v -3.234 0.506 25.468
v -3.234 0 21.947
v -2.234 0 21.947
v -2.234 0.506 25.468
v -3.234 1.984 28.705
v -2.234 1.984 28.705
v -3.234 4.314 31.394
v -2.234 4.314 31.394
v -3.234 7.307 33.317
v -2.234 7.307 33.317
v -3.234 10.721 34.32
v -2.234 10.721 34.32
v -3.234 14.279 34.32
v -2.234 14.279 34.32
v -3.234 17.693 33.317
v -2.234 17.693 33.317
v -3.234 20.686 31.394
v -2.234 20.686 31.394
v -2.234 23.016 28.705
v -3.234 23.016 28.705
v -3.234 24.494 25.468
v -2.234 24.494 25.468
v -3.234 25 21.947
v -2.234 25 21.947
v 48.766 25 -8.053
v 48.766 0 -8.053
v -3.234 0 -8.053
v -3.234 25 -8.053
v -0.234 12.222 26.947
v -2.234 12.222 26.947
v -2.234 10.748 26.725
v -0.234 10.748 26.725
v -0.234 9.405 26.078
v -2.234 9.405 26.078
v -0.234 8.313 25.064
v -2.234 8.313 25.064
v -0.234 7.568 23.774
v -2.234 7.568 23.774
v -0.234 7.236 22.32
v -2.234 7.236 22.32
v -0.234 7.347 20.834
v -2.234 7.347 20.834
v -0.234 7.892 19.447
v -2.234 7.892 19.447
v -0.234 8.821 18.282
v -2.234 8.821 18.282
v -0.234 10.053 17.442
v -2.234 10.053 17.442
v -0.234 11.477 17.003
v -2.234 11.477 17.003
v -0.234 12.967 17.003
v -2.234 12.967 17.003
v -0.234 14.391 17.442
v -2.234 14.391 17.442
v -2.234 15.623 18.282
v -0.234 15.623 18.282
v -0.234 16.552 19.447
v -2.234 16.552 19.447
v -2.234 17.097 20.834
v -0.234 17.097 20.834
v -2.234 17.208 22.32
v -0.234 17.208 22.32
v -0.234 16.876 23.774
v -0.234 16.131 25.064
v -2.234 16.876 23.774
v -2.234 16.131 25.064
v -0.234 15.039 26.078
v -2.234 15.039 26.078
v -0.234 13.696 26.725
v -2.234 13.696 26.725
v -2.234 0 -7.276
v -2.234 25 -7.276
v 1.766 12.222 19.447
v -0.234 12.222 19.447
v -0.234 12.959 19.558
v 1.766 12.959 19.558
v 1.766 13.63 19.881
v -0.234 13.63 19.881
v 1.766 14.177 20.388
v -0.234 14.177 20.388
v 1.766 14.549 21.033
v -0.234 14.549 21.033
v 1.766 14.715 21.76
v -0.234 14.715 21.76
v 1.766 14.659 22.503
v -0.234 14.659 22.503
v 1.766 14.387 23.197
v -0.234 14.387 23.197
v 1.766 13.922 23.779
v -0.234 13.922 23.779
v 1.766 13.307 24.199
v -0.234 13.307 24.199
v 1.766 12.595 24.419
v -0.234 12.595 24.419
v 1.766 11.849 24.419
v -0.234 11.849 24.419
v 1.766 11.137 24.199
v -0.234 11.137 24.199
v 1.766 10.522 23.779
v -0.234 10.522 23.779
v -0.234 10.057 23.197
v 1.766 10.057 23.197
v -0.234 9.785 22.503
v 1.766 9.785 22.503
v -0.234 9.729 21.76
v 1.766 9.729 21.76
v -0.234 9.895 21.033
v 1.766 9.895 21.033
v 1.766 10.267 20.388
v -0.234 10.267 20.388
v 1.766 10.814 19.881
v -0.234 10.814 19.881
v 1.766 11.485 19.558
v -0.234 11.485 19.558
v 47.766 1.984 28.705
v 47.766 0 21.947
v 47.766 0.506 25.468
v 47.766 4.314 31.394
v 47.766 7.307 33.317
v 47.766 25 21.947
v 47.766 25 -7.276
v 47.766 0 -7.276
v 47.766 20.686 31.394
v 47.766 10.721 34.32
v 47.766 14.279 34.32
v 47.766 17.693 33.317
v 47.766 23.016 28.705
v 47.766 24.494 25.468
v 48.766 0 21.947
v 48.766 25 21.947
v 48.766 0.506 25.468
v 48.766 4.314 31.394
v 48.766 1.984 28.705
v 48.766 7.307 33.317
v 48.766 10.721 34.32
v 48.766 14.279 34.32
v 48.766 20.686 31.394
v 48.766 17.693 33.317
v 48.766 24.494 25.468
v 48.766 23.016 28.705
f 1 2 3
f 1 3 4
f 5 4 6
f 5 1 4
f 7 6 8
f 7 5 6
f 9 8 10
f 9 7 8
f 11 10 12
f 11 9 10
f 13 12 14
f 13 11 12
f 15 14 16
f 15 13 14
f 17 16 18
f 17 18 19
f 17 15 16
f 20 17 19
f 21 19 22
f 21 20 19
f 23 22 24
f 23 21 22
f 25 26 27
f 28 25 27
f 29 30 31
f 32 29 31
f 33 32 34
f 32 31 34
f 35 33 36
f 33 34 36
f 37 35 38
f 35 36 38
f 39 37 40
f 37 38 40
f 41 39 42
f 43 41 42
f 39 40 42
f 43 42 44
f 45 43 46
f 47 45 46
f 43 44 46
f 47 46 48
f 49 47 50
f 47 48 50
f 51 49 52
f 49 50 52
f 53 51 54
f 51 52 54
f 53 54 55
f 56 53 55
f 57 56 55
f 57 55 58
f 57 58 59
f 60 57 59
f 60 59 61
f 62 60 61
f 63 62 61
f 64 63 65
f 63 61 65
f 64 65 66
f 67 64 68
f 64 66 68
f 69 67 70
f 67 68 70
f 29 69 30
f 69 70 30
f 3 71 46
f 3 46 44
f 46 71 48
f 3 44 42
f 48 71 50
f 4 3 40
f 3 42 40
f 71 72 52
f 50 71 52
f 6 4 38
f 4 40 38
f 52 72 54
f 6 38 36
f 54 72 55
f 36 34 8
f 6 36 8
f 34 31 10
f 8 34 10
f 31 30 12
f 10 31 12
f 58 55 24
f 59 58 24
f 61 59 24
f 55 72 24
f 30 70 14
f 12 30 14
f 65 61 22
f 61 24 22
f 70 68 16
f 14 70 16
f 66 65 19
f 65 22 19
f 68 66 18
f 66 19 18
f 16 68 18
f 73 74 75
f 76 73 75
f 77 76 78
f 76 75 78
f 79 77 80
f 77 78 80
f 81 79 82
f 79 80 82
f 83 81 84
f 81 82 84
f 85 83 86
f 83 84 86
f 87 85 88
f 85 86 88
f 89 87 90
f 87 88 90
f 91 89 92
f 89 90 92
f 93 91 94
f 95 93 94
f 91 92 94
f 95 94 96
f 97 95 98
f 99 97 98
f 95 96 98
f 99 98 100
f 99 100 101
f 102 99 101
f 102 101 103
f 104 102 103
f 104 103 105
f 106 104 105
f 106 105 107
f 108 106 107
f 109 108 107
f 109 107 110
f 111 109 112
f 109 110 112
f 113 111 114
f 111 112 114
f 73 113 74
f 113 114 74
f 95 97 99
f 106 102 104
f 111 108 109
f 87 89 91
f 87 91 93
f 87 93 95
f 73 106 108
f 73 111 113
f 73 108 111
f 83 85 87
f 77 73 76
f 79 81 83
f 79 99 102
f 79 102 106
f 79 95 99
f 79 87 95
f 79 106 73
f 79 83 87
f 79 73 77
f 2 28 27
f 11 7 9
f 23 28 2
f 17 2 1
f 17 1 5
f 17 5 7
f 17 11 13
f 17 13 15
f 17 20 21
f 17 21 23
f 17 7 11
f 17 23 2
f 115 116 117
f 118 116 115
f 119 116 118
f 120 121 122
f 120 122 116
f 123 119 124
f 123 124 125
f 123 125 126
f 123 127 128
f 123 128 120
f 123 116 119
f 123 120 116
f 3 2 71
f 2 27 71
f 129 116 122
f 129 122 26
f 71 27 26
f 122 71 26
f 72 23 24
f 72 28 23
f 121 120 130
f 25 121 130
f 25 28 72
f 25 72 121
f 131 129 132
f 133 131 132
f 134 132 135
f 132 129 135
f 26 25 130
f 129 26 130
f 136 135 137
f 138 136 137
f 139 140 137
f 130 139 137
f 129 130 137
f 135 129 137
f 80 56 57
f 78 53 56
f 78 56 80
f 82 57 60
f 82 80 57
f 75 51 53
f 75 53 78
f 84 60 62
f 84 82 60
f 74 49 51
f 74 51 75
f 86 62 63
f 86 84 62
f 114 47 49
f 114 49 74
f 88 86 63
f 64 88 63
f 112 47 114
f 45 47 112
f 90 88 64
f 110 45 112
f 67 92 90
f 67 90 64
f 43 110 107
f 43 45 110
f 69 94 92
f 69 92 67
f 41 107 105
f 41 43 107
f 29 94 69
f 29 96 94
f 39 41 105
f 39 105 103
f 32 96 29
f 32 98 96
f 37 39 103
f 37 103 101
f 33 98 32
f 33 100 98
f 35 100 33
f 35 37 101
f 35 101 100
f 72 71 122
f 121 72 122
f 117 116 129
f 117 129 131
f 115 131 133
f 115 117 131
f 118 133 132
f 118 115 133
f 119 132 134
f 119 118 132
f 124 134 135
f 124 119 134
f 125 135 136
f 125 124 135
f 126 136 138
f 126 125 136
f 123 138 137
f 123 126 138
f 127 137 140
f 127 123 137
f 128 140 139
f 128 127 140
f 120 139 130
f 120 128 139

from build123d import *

# Parameters (mm, degrees)
BOSS_EXTRU_1_DEPTH = 25
BOSS_EXTRU_2_DEPTH = 1
BOSS_EXTRU_3_START = -1
BOSS_EXTRU_3_DEPTH = 1
ESQUISSE6_R        = 5
BOSS_EXTRU_4_DEPTH = 2
ESQUISSE7_R        = 2.5
BOSS_EXTRU_5_DEPTH = 2


with BuildPart() as part:
    # Esquisse1 → Boss.-Extru.1 (new body)
    with BuildSketch(Plane(origin=(0, 0, 0), x_dir=(1, 0, 0), z_dir=(0, 1, 0))):
        Polygon((-3.234042553, -21.946808511), (-2.234042553, -21.946808511), (-2.234042553, 7.275558935), (47.765957447, 7.275558935), (47.765957447, -21.946808511), (48.765957447, -21.946808511), (48.765957447, 8.053191489), (-3.234042553, 8.053191489), align=None)
    extrude(amount=BOSS_EXTRU_1_DEPTH)

    # Esquisse3 → Boss.-Extru.2 (add)
    with BuildSketch(Plane.ZY.offset(3.234042553)):
        with BuildLine():
            Line((21.946808511, 25), (21.946808511, 0))
            ThreePointArc((21.946808511, 0), (34.446808511, 12.5), (21.946808511, 25))
        make_face()
    extrude(amount=-BOSS_EXTRU_2_DEPTH)

    # Esquisse4 → Boss.-Extru.3 (add)
    with BuildSketch(Plane(origin=(48.765957447, 0, 0), x_dir=(0, 0, -1), z_dir=(1, 0, 0)).offset(BOSS_EXTRU_3_START)):
        with BuildLine():
            Line((-21.946808511, 25), (-21.946808511, 0))
            ThreePointArc((-21.946808511, 0), (-34.446808511, 12.5), (-21.946808511, 25))
        make_face()
    extrude(amount=BOSS_EXTRU_3_DEPTH)

    # Esquisse6 → Boss.-Extru.4 (add)
    with BuildSketch(Plane(origin=(-2.234042553, 0, 0), x_dir=(0, 0, -1), z_dir=(1, 0, 0))):
        with Locations(Location((-21.946808511, 12.22196254, 0), (0, 0, 180))):
            Circle(ESQUISSE6_R)
    extrude(amount=BOSS_EXTRU_4_DEPTH)

    # Esquisse7 → Boss.-Extru.5 (add)
    with BuildSketch(Plane(origin=(-0.234042553, 0, 0), x_dir=(0, 0, -1), z_dir=(1, 0, 0))):
        with Locations((-21.946808511, 12.22196254)):
            Circle(ESQUISSE7_R)
    extrude(amount=BOSS_EXTRU_5_DEPTH)


solid = part.part
